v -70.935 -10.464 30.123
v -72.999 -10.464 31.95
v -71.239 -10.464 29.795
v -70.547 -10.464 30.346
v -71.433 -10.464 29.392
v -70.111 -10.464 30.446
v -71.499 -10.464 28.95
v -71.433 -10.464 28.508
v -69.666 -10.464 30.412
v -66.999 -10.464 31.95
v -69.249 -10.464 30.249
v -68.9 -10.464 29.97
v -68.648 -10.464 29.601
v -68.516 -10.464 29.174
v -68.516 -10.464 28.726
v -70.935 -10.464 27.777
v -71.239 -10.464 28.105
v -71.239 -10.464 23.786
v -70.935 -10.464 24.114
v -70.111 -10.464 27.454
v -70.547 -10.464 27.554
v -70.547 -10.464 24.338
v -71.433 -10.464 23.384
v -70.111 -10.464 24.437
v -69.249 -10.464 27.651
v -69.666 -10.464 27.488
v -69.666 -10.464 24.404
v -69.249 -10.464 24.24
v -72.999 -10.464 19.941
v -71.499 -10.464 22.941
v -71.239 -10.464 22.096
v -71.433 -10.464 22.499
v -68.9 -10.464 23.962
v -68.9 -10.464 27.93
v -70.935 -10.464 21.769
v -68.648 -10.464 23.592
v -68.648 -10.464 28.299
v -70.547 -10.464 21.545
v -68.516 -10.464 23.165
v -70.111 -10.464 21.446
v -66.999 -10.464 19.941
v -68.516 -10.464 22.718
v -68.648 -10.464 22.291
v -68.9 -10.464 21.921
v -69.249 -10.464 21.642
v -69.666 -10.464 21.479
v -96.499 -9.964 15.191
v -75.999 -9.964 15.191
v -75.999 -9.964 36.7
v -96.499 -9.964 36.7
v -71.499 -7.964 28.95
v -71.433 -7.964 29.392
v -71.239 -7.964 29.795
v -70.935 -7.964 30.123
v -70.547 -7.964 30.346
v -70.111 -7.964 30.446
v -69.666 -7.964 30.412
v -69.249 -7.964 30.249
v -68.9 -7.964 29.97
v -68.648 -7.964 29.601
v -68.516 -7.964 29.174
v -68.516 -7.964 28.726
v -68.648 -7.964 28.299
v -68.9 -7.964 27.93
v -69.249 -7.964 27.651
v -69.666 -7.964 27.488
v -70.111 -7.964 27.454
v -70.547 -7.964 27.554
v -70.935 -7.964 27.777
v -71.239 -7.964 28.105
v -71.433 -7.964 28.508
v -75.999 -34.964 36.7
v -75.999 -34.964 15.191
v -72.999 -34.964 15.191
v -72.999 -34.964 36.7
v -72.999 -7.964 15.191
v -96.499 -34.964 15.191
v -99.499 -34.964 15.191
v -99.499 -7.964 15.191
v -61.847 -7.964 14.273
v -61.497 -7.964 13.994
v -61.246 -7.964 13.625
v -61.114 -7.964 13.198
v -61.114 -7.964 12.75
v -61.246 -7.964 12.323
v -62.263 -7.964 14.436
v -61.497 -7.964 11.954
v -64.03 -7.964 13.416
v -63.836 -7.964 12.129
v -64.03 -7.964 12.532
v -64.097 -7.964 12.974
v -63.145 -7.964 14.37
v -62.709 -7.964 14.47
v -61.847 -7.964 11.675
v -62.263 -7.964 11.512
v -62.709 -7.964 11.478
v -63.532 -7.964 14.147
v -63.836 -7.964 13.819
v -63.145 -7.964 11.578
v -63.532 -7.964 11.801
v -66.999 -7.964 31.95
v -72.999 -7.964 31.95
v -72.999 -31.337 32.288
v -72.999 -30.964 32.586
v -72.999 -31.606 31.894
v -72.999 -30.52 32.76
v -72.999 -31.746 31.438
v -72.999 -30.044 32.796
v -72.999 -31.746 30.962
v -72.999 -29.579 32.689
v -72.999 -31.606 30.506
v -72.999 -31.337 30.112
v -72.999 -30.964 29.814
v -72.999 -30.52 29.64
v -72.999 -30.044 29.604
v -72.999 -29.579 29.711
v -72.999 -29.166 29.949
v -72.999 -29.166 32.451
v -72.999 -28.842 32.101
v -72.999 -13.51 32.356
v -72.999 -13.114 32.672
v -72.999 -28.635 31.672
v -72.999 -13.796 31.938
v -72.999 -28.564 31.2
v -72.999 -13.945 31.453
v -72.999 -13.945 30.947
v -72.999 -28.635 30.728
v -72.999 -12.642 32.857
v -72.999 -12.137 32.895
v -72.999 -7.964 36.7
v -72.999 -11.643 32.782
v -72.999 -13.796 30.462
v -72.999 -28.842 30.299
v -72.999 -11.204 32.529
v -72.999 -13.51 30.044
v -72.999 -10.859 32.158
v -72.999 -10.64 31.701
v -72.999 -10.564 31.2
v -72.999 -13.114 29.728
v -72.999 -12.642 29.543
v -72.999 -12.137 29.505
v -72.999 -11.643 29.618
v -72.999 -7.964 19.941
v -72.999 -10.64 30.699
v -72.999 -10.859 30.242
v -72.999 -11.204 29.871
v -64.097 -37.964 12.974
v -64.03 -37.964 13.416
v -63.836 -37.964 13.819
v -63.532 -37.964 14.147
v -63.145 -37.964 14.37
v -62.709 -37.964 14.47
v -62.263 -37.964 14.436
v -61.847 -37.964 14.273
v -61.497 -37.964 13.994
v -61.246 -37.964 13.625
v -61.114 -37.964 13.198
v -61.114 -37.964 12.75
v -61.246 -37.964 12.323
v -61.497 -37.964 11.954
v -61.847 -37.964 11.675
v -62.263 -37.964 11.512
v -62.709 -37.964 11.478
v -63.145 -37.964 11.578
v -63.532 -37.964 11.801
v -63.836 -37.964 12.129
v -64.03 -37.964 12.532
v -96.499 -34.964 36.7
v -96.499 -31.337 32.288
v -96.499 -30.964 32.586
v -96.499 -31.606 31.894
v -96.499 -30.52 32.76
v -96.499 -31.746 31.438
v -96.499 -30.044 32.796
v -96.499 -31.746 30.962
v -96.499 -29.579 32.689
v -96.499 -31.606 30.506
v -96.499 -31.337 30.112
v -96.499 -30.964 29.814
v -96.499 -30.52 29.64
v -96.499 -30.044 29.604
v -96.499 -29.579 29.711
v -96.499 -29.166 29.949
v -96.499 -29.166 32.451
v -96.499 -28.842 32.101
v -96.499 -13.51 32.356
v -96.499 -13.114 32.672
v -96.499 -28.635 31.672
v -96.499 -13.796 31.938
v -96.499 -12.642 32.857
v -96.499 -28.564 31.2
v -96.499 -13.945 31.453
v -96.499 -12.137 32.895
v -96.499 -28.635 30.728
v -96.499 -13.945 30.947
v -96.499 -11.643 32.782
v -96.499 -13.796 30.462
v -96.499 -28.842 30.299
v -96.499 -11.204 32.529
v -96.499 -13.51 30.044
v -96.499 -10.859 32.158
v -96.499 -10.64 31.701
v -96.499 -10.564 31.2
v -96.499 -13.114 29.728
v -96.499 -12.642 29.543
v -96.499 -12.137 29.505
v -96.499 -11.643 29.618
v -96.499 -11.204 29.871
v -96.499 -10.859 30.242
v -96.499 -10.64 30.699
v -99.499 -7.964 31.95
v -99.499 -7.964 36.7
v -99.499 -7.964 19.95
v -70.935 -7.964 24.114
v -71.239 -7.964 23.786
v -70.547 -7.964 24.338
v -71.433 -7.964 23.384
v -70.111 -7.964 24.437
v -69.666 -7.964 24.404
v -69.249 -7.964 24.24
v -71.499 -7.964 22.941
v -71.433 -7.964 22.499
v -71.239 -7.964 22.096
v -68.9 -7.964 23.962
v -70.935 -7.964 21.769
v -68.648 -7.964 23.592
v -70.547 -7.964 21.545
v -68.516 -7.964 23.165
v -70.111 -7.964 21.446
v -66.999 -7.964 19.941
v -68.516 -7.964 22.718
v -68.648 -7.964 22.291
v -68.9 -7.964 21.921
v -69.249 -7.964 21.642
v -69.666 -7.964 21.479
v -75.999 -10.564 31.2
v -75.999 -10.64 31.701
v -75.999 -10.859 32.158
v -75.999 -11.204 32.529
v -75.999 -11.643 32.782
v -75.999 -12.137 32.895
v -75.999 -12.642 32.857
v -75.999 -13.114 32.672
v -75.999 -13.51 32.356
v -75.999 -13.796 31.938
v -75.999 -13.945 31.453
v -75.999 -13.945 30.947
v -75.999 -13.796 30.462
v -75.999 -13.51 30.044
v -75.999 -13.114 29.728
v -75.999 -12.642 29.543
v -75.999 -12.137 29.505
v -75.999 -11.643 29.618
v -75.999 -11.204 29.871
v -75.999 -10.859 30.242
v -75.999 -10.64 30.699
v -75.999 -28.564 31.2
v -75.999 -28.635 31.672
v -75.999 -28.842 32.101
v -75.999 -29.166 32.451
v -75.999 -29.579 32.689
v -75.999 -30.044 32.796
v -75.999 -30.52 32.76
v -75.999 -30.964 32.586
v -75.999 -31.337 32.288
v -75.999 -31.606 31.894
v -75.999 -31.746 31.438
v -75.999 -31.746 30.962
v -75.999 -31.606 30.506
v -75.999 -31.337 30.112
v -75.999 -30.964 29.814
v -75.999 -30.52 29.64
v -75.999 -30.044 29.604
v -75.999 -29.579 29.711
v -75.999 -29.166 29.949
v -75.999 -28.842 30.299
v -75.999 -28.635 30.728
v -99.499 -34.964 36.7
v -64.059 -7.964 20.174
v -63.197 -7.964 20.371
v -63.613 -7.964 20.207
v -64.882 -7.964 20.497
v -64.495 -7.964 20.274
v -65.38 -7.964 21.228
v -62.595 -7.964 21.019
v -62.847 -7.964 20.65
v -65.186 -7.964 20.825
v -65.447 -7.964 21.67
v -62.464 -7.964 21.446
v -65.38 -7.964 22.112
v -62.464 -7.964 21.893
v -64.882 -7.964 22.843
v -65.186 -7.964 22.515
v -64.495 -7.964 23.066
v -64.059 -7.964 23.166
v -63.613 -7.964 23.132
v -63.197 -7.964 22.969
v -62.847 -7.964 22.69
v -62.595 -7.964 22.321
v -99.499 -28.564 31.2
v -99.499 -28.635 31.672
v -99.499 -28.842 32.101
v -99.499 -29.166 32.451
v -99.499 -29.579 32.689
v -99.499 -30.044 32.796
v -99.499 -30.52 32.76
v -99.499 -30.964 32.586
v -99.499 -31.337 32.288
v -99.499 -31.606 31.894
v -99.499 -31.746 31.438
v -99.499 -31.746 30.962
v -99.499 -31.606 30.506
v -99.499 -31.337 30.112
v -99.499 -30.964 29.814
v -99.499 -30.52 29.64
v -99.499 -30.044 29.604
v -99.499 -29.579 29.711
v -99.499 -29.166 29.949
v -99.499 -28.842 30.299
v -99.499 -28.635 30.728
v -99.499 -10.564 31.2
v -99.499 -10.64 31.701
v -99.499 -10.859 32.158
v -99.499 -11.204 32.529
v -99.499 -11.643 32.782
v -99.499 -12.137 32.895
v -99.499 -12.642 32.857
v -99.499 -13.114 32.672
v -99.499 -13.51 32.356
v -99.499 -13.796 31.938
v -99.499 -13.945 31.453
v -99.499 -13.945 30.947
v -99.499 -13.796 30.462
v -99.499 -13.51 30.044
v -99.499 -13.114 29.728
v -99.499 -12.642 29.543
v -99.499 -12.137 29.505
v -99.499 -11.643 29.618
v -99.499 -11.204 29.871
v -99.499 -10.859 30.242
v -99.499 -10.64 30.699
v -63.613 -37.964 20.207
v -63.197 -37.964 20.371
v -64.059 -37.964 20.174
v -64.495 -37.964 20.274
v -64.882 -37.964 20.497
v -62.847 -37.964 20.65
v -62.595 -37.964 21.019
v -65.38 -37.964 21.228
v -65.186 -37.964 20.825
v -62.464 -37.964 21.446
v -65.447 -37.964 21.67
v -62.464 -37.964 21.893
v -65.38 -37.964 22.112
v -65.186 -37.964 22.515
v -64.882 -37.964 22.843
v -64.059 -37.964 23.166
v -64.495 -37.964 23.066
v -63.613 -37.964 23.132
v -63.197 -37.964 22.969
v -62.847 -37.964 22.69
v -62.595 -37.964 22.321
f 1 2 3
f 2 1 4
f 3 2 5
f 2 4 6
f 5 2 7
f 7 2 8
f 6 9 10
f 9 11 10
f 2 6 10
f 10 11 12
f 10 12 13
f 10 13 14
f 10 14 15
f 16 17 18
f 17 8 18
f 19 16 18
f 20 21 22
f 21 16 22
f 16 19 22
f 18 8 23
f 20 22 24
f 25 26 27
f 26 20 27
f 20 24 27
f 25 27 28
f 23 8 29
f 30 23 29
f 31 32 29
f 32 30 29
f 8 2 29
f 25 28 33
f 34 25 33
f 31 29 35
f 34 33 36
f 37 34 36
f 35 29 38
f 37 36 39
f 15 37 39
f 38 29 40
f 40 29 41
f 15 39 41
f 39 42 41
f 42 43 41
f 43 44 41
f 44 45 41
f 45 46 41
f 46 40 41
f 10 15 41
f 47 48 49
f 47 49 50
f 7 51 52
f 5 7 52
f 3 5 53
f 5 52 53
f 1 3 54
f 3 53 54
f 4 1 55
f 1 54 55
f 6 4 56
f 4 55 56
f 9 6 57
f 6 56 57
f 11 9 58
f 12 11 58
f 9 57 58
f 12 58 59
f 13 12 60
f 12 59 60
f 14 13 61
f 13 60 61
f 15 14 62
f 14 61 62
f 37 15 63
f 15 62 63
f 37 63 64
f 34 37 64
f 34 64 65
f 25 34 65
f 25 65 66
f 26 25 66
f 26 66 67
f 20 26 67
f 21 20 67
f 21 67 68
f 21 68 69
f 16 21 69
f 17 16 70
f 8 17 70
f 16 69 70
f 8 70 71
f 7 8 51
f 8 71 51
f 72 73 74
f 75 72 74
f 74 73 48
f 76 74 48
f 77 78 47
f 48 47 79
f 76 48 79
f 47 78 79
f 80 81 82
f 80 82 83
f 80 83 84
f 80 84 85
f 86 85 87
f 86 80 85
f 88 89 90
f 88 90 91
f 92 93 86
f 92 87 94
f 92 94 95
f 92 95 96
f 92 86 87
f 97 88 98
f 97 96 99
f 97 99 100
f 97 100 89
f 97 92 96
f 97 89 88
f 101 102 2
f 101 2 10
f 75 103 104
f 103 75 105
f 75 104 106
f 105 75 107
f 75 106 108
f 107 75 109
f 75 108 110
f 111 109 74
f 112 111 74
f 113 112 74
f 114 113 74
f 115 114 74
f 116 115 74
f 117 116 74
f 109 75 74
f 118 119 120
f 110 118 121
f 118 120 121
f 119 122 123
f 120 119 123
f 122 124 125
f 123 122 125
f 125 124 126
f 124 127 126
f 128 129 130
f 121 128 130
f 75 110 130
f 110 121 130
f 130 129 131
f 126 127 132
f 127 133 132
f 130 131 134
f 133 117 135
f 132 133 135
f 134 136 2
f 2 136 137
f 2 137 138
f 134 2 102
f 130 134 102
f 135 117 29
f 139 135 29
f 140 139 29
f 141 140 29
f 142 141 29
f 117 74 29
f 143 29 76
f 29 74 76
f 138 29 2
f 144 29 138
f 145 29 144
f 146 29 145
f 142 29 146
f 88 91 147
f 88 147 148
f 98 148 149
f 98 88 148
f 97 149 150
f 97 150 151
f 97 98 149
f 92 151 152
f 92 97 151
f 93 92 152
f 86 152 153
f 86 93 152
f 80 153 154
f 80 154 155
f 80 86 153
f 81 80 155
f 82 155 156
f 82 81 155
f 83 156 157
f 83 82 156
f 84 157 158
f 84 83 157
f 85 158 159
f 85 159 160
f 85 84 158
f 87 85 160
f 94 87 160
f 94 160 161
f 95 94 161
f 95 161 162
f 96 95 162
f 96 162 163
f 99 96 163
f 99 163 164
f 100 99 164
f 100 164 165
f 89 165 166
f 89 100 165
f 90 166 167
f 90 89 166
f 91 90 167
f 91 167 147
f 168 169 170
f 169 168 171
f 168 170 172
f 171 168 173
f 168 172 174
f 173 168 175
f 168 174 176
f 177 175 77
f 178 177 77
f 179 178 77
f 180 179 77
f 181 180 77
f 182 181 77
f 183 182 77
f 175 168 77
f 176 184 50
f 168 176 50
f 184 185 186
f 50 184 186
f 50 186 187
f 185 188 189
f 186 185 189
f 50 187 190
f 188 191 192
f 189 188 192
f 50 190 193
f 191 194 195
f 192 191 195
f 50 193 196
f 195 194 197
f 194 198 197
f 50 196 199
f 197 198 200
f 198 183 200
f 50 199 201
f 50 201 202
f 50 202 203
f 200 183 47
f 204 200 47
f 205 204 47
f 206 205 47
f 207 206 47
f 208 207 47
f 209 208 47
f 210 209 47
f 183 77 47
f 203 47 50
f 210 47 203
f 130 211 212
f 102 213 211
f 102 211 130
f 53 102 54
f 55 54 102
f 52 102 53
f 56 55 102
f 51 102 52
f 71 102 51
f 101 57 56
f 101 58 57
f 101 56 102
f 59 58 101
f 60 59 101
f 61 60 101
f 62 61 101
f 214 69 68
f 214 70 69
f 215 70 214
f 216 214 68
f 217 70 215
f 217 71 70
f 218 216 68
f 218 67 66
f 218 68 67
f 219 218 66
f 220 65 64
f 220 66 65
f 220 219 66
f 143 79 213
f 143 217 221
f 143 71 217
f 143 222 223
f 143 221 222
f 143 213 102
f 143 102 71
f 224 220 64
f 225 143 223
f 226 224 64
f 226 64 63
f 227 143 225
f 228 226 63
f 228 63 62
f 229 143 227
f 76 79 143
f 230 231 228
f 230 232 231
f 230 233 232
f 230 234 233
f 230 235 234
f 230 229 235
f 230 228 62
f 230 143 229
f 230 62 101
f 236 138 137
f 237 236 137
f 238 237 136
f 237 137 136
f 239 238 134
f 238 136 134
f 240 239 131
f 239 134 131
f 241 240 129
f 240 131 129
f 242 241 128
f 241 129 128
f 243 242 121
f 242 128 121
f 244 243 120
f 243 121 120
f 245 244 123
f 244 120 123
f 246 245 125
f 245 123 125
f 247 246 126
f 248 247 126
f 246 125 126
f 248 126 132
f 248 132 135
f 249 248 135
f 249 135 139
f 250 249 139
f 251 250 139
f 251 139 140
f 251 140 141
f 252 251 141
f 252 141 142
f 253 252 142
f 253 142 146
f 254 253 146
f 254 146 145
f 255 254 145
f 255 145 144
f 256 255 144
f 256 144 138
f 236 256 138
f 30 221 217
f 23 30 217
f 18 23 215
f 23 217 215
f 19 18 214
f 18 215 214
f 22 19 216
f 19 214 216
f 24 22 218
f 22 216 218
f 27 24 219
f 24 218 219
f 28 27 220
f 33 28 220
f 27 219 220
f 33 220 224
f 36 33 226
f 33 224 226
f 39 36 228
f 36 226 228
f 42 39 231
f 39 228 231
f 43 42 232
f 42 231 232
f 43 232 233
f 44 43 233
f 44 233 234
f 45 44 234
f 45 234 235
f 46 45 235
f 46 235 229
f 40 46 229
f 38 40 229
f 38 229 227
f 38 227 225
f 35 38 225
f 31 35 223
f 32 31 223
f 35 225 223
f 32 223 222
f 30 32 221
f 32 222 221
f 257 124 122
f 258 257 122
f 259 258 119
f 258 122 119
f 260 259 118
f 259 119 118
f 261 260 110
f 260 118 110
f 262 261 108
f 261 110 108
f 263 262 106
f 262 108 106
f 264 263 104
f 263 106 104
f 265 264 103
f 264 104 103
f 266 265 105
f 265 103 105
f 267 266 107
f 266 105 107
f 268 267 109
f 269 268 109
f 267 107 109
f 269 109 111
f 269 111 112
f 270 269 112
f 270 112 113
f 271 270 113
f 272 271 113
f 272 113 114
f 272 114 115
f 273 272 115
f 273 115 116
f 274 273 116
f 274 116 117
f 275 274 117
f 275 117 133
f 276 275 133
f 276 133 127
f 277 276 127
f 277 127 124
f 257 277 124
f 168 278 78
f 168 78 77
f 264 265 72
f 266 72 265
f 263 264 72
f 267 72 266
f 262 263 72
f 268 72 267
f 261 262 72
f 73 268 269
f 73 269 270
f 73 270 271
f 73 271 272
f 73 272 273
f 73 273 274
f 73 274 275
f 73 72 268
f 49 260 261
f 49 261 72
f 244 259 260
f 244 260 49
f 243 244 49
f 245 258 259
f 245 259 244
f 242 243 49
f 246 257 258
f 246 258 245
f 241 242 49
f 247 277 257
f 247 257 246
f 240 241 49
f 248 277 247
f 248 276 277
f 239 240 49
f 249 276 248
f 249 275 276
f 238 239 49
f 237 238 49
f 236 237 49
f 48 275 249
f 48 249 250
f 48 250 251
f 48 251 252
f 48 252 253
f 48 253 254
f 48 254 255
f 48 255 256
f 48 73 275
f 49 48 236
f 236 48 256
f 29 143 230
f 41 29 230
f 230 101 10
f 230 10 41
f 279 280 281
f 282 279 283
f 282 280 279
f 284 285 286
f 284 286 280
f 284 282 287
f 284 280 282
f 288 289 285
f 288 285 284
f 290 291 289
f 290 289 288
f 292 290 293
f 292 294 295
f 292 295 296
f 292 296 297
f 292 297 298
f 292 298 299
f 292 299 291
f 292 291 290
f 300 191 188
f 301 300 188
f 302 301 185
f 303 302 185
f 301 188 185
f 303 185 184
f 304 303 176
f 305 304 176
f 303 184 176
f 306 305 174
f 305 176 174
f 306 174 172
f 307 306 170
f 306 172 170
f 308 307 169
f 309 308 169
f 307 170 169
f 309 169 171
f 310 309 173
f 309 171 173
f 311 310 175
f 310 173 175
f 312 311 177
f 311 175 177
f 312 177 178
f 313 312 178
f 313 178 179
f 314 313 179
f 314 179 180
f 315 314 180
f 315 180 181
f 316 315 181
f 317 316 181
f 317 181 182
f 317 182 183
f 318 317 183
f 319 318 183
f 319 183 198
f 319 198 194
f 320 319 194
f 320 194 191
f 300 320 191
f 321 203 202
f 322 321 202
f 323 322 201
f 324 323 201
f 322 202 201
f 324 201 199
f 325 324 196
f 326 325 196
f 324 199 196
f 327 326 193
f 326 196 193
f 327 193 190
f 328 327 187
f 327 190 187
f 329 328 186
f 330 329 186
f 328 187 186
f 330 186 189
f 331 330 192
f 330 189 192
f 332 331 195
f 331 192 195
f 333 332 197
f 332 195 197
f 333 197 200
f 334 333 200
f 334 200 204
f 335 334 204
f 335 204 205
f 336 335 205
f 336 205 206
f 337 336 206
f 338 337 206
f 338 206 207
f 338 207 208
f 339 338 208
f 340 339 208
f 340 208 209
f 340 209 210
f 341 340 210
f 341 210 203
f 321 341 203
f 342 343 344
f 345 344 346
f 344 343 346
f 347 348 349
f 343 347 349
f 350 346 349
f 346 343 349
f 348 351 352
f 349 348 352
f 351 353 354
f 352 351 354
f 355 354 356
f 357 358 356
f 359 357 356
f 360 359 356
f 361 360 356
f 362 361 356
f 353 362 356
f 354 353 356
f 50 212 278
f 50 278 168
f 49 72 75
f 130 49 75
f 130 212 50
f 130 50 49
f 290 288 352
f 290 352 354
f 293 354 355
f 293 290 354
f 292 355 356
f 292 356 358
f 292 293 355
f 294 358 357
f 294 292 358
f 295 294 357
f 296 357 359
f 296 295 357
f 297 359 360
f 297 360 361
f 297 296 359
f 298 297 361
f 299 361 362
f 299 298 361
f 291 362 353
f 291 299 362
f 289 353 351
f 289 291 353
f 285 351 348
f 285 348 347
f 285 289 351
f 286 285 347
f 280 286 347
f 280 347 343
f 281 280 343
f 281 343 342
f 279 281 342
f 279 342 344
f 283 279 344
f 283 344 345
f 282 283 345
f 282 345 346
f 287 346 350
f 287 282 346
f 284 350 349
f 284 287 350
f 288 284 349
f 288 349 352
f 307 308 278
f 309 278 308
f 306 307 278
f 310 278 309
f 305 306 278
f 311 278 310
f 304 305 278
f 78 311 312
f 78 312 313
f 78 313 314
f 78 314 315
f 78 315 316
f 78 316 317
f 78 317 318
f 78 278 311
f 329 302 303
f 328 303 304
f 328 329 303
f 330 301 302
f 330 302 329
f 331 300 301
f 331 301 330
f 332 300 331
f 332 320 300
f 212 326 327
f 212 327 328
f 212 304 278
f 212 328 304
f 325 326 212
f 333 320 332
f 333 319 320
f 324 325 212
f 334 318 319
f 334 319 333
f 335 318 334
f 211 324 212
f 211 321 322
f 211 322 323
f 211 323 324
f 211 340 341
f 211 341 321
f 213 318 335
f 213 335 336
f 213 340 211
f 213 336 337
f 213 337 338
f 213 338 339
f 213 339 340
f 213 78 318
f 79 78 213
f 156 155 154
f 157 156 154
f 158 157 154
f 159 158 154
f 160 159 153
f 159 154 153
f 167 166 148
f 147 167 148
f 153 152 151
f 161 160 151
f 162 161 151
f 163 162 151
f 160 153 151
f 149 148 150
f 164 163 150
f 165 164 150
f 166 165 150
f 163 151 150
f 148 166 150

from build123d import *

# Parameters (mm, degrees)
SKETCH1_W             = 26.5
SKETCH1_H             = 27
BOSS_EXTRUDE1_DEPTH   = 36.7
SKETCH2_W             = 20.5
SKETCH2_H             = 25
CUT_EXTRUDE1_DEPTH    = 36.7
SKETCH3_R             = 1.7
SKETCH3_R_2           = 1.6
CUT_EXTRUDE2_DEPTH    = 36.7
SKETCH4_R             = 3
CUT_EXTRUDE3_DEPTH    = 36.7
SKETCH8_R             = 1.5
BOSS_EXTRUDE3_DEPTH   = 30
BOSS_EXTRUDE3_2_DEPTH = 30
SKETCH9_W             = 5.918746276
SKETCH9_H             = 6
SKETCH9_W_2           = 6.707912446
CUT_EXTRUDE4_DEPTH    = 12
SKETCH11_W            = 15.191448775
SKETCH11_H            = 37.067540439
CUT_EXTRUDE6_DEPTH    = 32
SKETCH12_W            = 12
SKETCH12_H            = 2.5
BOSS_EXTRUDE4_DEPTH   = 6
SKETCH13_R            = 1.5
CUT_EXTRUDE7_DEPTH    = 6
SKETCH14_W            = 11.732424075
SKETCH14_H            = 31.976606793
CUT_EXTRUDE8_DEPTH    = 10
SKETCH15_W            = 6
SKETCH15_H            = 12.008551225
SKETCH15_R            = 1.5
BOSS_EXTRUDE5_DEPTH   = 2.5
SKETCH16_W            = 54.936099305
SKETCH16_H            = 35.316063839
CUT_EXTRUDE9_DEPTH    = 50


with BuildPart() as part:
    # Sketch1 → Boss-Extrude1 (new body)
    with BuildSketch(Plane.XY):
        with Locations((-15.427732696, -21.46401366)):
            Rectangle(SKETCH1_W, SKETCH1_H)
    extrude(amount=BOSS_EXTRUDE1_DEPTH)

    # Sketch2 → Cut-Extrude1 (cut)
    with BuildSketch(Plane(origin=(0, 0, 0), x_dir=(-1, 0, 0), z_dir=(0, 0, -1))):
        with Locations((15.427732696, -22.46401366)):
            Rectangle(SKETCH2_W, SKETCH2_H)
    extrude(amount=-CUT_EXTRUDE1_DEPTH, mode=Mode.SUBTRACT)

    # Sketch3 → Cut-Extrude2 (cut)
    with BuildSketch(Plane(origin=(-2.177732696, 0, 0), x_dir=(0, 0, -1), z_dir=(1, 0, 0))):
        with Locations(Location((-31.2, -12.26401366, 0), (0, 0, 90))):
            Circle(SKETCH3_R)
        with Locations(Location((-31.2, -30.16401366, 0), (0, 0, 90))):
            Circle(SKETCH3_R_2)
    extrude(amount=-CUT_EXTRUDE2_DEPTH, mode=Mode.SUBTRACT)

    # Sketch4 → Cut-Extrude3 (cut)
    with BuildSketch(Plane(origin=(-2.177732696, 0, 0), x_dir=(0, 0, -1), z_dir=(1, 0, 0))):
        with Locations(Location((-12.025092395, -21.16401366, 0), (0, 0, 90))):
            Circle(SKETCH4_R)
    extrude(amount=-CUT_EXTRUDE3_DEPTH, mode=Mode.SUBTRACT)

    # Sketch9 → Cut-Extrude4 (cut)
    with BuildSketch(Plane(origin=(0, 0, 0), x_dir=(-1, 0, 0), z_dir=(0, 0, -1))):
        with Locations((3.689038825, -21.16401366)):
            Rectangle(SKETCH9_W, SKETCH9_H)
        with Locations((28.103867214, -21.16401366)):
            Rectangle(SKETCH9_W_2, SKETCH9_H)
    extrude(amount=-CUT_EXTRUDE4_DEPTH, mode=Mode.SUBTRACT)

    # Sketch11 → Cut-Extrude6 (cut)
    with BuildSketch(Plane.ZY.offset(28.677732696)):
        with Locations((7.595724388, -16.43024344)):
            Rectangle(SKETCH11_W, SKETCH11_H)
    extrude(amount=-CUT_EXTRUDE6_DEPTH, mode=Mode.SUBTRACT)

    # Sketch12 → Boss-Extrude4 (add)
    with BuildSketch(Plane.ZY.offset(28.677732696)):
        with Locations((25.95, -9.21401366)):
            Rectangle(SKETCH12_W, SKETCH12_H)
    extrude(amount=BOSS_EXTRUDE4_DEPTH)

    # Sketch13 → Cut-Extrude7 (cut)
    with BuildSketch(Plane(origin=(0, -7.96401366, 0), x_dir=(1, 0, 0), z_dir=(0, 1, 0))):
        with Locations(Location((-31.677732696, -22.95, 0), (0, 0, 180))):
            Circle(SKETCH13_R)
        with Locations(Location((-31.677732696, -28.95, 0), (0, 0, 180))):
            Circle(SKETCH13_R)
    extrude(amount=-CUT_EXTRUDE7_DEPTH, mode=Mode.SUBTRACT)


with BuildPart() as body_2:
    # Sketch8 → Boss-Extrude3 (new body)
    with BuildSketch(Plane(origin=(0, -7.96401366, 0), x_dir=(1, 0, 0), z_dir=(0, 1, 0))):
        with Locations(Location((7.15742756, -12.973989901, 0), (0, 0, 180))):
            Circle(SKETCH8_R)
    extrude(amount=-BOSS_EXTRUDE3_DEPTH)


with BuildPart() as body_3:
    # Sketch8 → Boss-Extrude3 2 (new body)
    with BuildSketch(Plane(origin=(0, -7.96401366, 0), x_dir=(1, 0, 0), z_dir=(0, 1, 0))):
        with Locations(Location((7.574350551, -21.669812293, 0), (0, 0, 180))):
            Circle(SKETCH8_R)
    extrude(amount=-BOSS_EXTRUDE3_2_DEPTH)


with BuildPart() as body_4:
    # Body-Move/Copy4: copy of part
    add(part.part.moved(Location((-70.821628829, 0, 0))))

    # Sketch14 → Cut-Extrude8 (cut)
    with BuildSketch(Plane(origin=(0, -7.96401366, 0), x_dir=(1, 0, 0), z_dir=(0, 1, 0))):
        with Locations((-105.365573562, -18.867606945)):
            Rectangle(SKETCH14_W, SKETCH14_H)
    extrude(amount=-CUT_EXTRUDE8_DEPTH, mode=Mode.SUBTRACT)

    # Sketch15 → Boss-Extrude5 (add)
    with BuildSketch(Plane(origin=(0, -7.96401366, 0), x_dir=(1, 0, 0), z_dir=(0, 1, 0))):
        with Locations((-69.999361524, -25.945724388)):
            Rectangle(SKETCH15_W, SKETCH15_H)
        with Locations(Location((-69.999361524, -22.941448775, 0), (0, 0, 180))):
            Circle(SKETCH15_R, mode=Mode.SUBTRACT)
        with Locations(Location((-69.999361524, -28.95, 0), (0, 0, 180))):
            Circle(SKETCH15_R, mode=Mode.SUBTRACT)
    extrude(amount=-BOSS_EXTRUDE5_DEPTH)


with BuildPart() as body_5:
    # Body-Move/Copy5: copy of body 2
    add(body_2.part.moved(Location((-69.754488263, 0, 0))))


with BuildPart() as body_6:
    # Body-Move/Copy6: copy of body 3
    add(body_3.part.moved(Location((-71.521118541, 0, 0))))


with BuildPart() as cut_extrude9_tool:
    # Sketch16 → Cut-Extrude9 (new body)
    with BuildSketch(Plane(origin=(0, -7.96401366, 0), x_dir=(1, 0, 0), z_dir=(0, 1, 0))):
        with Locations((-11.531444604, -23.623773167)):
            Rectangle(SKETCH16_W, SKETCH16_H)
    extrude(amount=-CUT_EXTRUDE9_DEPTH)


with BuildPart() as part_1:
    add(part.part)

    # Cut-Extrude9: cut by cut_extrude9_tool
    add(cut_extrude9_tool.part, mode=Mode.SUBTRACT)


with BuildPart() as body_2_1:
    add(body_2.part)

    # Cut-Extrude9: cut by cut_extrude9_tool
    add(cut_extrude9_tool.part, mode=Mode.SUBTRACT)


with BuildPart() as body_3_1:
    add(body_3.part)

    # Cut-Extrude9: cut by cut_extrude9_tool
    add(cut_extrude9_tool.part, mode=Mode.SUBTRACT)


solid = Compound([body_4.part, body_5.part, body_6.part])
